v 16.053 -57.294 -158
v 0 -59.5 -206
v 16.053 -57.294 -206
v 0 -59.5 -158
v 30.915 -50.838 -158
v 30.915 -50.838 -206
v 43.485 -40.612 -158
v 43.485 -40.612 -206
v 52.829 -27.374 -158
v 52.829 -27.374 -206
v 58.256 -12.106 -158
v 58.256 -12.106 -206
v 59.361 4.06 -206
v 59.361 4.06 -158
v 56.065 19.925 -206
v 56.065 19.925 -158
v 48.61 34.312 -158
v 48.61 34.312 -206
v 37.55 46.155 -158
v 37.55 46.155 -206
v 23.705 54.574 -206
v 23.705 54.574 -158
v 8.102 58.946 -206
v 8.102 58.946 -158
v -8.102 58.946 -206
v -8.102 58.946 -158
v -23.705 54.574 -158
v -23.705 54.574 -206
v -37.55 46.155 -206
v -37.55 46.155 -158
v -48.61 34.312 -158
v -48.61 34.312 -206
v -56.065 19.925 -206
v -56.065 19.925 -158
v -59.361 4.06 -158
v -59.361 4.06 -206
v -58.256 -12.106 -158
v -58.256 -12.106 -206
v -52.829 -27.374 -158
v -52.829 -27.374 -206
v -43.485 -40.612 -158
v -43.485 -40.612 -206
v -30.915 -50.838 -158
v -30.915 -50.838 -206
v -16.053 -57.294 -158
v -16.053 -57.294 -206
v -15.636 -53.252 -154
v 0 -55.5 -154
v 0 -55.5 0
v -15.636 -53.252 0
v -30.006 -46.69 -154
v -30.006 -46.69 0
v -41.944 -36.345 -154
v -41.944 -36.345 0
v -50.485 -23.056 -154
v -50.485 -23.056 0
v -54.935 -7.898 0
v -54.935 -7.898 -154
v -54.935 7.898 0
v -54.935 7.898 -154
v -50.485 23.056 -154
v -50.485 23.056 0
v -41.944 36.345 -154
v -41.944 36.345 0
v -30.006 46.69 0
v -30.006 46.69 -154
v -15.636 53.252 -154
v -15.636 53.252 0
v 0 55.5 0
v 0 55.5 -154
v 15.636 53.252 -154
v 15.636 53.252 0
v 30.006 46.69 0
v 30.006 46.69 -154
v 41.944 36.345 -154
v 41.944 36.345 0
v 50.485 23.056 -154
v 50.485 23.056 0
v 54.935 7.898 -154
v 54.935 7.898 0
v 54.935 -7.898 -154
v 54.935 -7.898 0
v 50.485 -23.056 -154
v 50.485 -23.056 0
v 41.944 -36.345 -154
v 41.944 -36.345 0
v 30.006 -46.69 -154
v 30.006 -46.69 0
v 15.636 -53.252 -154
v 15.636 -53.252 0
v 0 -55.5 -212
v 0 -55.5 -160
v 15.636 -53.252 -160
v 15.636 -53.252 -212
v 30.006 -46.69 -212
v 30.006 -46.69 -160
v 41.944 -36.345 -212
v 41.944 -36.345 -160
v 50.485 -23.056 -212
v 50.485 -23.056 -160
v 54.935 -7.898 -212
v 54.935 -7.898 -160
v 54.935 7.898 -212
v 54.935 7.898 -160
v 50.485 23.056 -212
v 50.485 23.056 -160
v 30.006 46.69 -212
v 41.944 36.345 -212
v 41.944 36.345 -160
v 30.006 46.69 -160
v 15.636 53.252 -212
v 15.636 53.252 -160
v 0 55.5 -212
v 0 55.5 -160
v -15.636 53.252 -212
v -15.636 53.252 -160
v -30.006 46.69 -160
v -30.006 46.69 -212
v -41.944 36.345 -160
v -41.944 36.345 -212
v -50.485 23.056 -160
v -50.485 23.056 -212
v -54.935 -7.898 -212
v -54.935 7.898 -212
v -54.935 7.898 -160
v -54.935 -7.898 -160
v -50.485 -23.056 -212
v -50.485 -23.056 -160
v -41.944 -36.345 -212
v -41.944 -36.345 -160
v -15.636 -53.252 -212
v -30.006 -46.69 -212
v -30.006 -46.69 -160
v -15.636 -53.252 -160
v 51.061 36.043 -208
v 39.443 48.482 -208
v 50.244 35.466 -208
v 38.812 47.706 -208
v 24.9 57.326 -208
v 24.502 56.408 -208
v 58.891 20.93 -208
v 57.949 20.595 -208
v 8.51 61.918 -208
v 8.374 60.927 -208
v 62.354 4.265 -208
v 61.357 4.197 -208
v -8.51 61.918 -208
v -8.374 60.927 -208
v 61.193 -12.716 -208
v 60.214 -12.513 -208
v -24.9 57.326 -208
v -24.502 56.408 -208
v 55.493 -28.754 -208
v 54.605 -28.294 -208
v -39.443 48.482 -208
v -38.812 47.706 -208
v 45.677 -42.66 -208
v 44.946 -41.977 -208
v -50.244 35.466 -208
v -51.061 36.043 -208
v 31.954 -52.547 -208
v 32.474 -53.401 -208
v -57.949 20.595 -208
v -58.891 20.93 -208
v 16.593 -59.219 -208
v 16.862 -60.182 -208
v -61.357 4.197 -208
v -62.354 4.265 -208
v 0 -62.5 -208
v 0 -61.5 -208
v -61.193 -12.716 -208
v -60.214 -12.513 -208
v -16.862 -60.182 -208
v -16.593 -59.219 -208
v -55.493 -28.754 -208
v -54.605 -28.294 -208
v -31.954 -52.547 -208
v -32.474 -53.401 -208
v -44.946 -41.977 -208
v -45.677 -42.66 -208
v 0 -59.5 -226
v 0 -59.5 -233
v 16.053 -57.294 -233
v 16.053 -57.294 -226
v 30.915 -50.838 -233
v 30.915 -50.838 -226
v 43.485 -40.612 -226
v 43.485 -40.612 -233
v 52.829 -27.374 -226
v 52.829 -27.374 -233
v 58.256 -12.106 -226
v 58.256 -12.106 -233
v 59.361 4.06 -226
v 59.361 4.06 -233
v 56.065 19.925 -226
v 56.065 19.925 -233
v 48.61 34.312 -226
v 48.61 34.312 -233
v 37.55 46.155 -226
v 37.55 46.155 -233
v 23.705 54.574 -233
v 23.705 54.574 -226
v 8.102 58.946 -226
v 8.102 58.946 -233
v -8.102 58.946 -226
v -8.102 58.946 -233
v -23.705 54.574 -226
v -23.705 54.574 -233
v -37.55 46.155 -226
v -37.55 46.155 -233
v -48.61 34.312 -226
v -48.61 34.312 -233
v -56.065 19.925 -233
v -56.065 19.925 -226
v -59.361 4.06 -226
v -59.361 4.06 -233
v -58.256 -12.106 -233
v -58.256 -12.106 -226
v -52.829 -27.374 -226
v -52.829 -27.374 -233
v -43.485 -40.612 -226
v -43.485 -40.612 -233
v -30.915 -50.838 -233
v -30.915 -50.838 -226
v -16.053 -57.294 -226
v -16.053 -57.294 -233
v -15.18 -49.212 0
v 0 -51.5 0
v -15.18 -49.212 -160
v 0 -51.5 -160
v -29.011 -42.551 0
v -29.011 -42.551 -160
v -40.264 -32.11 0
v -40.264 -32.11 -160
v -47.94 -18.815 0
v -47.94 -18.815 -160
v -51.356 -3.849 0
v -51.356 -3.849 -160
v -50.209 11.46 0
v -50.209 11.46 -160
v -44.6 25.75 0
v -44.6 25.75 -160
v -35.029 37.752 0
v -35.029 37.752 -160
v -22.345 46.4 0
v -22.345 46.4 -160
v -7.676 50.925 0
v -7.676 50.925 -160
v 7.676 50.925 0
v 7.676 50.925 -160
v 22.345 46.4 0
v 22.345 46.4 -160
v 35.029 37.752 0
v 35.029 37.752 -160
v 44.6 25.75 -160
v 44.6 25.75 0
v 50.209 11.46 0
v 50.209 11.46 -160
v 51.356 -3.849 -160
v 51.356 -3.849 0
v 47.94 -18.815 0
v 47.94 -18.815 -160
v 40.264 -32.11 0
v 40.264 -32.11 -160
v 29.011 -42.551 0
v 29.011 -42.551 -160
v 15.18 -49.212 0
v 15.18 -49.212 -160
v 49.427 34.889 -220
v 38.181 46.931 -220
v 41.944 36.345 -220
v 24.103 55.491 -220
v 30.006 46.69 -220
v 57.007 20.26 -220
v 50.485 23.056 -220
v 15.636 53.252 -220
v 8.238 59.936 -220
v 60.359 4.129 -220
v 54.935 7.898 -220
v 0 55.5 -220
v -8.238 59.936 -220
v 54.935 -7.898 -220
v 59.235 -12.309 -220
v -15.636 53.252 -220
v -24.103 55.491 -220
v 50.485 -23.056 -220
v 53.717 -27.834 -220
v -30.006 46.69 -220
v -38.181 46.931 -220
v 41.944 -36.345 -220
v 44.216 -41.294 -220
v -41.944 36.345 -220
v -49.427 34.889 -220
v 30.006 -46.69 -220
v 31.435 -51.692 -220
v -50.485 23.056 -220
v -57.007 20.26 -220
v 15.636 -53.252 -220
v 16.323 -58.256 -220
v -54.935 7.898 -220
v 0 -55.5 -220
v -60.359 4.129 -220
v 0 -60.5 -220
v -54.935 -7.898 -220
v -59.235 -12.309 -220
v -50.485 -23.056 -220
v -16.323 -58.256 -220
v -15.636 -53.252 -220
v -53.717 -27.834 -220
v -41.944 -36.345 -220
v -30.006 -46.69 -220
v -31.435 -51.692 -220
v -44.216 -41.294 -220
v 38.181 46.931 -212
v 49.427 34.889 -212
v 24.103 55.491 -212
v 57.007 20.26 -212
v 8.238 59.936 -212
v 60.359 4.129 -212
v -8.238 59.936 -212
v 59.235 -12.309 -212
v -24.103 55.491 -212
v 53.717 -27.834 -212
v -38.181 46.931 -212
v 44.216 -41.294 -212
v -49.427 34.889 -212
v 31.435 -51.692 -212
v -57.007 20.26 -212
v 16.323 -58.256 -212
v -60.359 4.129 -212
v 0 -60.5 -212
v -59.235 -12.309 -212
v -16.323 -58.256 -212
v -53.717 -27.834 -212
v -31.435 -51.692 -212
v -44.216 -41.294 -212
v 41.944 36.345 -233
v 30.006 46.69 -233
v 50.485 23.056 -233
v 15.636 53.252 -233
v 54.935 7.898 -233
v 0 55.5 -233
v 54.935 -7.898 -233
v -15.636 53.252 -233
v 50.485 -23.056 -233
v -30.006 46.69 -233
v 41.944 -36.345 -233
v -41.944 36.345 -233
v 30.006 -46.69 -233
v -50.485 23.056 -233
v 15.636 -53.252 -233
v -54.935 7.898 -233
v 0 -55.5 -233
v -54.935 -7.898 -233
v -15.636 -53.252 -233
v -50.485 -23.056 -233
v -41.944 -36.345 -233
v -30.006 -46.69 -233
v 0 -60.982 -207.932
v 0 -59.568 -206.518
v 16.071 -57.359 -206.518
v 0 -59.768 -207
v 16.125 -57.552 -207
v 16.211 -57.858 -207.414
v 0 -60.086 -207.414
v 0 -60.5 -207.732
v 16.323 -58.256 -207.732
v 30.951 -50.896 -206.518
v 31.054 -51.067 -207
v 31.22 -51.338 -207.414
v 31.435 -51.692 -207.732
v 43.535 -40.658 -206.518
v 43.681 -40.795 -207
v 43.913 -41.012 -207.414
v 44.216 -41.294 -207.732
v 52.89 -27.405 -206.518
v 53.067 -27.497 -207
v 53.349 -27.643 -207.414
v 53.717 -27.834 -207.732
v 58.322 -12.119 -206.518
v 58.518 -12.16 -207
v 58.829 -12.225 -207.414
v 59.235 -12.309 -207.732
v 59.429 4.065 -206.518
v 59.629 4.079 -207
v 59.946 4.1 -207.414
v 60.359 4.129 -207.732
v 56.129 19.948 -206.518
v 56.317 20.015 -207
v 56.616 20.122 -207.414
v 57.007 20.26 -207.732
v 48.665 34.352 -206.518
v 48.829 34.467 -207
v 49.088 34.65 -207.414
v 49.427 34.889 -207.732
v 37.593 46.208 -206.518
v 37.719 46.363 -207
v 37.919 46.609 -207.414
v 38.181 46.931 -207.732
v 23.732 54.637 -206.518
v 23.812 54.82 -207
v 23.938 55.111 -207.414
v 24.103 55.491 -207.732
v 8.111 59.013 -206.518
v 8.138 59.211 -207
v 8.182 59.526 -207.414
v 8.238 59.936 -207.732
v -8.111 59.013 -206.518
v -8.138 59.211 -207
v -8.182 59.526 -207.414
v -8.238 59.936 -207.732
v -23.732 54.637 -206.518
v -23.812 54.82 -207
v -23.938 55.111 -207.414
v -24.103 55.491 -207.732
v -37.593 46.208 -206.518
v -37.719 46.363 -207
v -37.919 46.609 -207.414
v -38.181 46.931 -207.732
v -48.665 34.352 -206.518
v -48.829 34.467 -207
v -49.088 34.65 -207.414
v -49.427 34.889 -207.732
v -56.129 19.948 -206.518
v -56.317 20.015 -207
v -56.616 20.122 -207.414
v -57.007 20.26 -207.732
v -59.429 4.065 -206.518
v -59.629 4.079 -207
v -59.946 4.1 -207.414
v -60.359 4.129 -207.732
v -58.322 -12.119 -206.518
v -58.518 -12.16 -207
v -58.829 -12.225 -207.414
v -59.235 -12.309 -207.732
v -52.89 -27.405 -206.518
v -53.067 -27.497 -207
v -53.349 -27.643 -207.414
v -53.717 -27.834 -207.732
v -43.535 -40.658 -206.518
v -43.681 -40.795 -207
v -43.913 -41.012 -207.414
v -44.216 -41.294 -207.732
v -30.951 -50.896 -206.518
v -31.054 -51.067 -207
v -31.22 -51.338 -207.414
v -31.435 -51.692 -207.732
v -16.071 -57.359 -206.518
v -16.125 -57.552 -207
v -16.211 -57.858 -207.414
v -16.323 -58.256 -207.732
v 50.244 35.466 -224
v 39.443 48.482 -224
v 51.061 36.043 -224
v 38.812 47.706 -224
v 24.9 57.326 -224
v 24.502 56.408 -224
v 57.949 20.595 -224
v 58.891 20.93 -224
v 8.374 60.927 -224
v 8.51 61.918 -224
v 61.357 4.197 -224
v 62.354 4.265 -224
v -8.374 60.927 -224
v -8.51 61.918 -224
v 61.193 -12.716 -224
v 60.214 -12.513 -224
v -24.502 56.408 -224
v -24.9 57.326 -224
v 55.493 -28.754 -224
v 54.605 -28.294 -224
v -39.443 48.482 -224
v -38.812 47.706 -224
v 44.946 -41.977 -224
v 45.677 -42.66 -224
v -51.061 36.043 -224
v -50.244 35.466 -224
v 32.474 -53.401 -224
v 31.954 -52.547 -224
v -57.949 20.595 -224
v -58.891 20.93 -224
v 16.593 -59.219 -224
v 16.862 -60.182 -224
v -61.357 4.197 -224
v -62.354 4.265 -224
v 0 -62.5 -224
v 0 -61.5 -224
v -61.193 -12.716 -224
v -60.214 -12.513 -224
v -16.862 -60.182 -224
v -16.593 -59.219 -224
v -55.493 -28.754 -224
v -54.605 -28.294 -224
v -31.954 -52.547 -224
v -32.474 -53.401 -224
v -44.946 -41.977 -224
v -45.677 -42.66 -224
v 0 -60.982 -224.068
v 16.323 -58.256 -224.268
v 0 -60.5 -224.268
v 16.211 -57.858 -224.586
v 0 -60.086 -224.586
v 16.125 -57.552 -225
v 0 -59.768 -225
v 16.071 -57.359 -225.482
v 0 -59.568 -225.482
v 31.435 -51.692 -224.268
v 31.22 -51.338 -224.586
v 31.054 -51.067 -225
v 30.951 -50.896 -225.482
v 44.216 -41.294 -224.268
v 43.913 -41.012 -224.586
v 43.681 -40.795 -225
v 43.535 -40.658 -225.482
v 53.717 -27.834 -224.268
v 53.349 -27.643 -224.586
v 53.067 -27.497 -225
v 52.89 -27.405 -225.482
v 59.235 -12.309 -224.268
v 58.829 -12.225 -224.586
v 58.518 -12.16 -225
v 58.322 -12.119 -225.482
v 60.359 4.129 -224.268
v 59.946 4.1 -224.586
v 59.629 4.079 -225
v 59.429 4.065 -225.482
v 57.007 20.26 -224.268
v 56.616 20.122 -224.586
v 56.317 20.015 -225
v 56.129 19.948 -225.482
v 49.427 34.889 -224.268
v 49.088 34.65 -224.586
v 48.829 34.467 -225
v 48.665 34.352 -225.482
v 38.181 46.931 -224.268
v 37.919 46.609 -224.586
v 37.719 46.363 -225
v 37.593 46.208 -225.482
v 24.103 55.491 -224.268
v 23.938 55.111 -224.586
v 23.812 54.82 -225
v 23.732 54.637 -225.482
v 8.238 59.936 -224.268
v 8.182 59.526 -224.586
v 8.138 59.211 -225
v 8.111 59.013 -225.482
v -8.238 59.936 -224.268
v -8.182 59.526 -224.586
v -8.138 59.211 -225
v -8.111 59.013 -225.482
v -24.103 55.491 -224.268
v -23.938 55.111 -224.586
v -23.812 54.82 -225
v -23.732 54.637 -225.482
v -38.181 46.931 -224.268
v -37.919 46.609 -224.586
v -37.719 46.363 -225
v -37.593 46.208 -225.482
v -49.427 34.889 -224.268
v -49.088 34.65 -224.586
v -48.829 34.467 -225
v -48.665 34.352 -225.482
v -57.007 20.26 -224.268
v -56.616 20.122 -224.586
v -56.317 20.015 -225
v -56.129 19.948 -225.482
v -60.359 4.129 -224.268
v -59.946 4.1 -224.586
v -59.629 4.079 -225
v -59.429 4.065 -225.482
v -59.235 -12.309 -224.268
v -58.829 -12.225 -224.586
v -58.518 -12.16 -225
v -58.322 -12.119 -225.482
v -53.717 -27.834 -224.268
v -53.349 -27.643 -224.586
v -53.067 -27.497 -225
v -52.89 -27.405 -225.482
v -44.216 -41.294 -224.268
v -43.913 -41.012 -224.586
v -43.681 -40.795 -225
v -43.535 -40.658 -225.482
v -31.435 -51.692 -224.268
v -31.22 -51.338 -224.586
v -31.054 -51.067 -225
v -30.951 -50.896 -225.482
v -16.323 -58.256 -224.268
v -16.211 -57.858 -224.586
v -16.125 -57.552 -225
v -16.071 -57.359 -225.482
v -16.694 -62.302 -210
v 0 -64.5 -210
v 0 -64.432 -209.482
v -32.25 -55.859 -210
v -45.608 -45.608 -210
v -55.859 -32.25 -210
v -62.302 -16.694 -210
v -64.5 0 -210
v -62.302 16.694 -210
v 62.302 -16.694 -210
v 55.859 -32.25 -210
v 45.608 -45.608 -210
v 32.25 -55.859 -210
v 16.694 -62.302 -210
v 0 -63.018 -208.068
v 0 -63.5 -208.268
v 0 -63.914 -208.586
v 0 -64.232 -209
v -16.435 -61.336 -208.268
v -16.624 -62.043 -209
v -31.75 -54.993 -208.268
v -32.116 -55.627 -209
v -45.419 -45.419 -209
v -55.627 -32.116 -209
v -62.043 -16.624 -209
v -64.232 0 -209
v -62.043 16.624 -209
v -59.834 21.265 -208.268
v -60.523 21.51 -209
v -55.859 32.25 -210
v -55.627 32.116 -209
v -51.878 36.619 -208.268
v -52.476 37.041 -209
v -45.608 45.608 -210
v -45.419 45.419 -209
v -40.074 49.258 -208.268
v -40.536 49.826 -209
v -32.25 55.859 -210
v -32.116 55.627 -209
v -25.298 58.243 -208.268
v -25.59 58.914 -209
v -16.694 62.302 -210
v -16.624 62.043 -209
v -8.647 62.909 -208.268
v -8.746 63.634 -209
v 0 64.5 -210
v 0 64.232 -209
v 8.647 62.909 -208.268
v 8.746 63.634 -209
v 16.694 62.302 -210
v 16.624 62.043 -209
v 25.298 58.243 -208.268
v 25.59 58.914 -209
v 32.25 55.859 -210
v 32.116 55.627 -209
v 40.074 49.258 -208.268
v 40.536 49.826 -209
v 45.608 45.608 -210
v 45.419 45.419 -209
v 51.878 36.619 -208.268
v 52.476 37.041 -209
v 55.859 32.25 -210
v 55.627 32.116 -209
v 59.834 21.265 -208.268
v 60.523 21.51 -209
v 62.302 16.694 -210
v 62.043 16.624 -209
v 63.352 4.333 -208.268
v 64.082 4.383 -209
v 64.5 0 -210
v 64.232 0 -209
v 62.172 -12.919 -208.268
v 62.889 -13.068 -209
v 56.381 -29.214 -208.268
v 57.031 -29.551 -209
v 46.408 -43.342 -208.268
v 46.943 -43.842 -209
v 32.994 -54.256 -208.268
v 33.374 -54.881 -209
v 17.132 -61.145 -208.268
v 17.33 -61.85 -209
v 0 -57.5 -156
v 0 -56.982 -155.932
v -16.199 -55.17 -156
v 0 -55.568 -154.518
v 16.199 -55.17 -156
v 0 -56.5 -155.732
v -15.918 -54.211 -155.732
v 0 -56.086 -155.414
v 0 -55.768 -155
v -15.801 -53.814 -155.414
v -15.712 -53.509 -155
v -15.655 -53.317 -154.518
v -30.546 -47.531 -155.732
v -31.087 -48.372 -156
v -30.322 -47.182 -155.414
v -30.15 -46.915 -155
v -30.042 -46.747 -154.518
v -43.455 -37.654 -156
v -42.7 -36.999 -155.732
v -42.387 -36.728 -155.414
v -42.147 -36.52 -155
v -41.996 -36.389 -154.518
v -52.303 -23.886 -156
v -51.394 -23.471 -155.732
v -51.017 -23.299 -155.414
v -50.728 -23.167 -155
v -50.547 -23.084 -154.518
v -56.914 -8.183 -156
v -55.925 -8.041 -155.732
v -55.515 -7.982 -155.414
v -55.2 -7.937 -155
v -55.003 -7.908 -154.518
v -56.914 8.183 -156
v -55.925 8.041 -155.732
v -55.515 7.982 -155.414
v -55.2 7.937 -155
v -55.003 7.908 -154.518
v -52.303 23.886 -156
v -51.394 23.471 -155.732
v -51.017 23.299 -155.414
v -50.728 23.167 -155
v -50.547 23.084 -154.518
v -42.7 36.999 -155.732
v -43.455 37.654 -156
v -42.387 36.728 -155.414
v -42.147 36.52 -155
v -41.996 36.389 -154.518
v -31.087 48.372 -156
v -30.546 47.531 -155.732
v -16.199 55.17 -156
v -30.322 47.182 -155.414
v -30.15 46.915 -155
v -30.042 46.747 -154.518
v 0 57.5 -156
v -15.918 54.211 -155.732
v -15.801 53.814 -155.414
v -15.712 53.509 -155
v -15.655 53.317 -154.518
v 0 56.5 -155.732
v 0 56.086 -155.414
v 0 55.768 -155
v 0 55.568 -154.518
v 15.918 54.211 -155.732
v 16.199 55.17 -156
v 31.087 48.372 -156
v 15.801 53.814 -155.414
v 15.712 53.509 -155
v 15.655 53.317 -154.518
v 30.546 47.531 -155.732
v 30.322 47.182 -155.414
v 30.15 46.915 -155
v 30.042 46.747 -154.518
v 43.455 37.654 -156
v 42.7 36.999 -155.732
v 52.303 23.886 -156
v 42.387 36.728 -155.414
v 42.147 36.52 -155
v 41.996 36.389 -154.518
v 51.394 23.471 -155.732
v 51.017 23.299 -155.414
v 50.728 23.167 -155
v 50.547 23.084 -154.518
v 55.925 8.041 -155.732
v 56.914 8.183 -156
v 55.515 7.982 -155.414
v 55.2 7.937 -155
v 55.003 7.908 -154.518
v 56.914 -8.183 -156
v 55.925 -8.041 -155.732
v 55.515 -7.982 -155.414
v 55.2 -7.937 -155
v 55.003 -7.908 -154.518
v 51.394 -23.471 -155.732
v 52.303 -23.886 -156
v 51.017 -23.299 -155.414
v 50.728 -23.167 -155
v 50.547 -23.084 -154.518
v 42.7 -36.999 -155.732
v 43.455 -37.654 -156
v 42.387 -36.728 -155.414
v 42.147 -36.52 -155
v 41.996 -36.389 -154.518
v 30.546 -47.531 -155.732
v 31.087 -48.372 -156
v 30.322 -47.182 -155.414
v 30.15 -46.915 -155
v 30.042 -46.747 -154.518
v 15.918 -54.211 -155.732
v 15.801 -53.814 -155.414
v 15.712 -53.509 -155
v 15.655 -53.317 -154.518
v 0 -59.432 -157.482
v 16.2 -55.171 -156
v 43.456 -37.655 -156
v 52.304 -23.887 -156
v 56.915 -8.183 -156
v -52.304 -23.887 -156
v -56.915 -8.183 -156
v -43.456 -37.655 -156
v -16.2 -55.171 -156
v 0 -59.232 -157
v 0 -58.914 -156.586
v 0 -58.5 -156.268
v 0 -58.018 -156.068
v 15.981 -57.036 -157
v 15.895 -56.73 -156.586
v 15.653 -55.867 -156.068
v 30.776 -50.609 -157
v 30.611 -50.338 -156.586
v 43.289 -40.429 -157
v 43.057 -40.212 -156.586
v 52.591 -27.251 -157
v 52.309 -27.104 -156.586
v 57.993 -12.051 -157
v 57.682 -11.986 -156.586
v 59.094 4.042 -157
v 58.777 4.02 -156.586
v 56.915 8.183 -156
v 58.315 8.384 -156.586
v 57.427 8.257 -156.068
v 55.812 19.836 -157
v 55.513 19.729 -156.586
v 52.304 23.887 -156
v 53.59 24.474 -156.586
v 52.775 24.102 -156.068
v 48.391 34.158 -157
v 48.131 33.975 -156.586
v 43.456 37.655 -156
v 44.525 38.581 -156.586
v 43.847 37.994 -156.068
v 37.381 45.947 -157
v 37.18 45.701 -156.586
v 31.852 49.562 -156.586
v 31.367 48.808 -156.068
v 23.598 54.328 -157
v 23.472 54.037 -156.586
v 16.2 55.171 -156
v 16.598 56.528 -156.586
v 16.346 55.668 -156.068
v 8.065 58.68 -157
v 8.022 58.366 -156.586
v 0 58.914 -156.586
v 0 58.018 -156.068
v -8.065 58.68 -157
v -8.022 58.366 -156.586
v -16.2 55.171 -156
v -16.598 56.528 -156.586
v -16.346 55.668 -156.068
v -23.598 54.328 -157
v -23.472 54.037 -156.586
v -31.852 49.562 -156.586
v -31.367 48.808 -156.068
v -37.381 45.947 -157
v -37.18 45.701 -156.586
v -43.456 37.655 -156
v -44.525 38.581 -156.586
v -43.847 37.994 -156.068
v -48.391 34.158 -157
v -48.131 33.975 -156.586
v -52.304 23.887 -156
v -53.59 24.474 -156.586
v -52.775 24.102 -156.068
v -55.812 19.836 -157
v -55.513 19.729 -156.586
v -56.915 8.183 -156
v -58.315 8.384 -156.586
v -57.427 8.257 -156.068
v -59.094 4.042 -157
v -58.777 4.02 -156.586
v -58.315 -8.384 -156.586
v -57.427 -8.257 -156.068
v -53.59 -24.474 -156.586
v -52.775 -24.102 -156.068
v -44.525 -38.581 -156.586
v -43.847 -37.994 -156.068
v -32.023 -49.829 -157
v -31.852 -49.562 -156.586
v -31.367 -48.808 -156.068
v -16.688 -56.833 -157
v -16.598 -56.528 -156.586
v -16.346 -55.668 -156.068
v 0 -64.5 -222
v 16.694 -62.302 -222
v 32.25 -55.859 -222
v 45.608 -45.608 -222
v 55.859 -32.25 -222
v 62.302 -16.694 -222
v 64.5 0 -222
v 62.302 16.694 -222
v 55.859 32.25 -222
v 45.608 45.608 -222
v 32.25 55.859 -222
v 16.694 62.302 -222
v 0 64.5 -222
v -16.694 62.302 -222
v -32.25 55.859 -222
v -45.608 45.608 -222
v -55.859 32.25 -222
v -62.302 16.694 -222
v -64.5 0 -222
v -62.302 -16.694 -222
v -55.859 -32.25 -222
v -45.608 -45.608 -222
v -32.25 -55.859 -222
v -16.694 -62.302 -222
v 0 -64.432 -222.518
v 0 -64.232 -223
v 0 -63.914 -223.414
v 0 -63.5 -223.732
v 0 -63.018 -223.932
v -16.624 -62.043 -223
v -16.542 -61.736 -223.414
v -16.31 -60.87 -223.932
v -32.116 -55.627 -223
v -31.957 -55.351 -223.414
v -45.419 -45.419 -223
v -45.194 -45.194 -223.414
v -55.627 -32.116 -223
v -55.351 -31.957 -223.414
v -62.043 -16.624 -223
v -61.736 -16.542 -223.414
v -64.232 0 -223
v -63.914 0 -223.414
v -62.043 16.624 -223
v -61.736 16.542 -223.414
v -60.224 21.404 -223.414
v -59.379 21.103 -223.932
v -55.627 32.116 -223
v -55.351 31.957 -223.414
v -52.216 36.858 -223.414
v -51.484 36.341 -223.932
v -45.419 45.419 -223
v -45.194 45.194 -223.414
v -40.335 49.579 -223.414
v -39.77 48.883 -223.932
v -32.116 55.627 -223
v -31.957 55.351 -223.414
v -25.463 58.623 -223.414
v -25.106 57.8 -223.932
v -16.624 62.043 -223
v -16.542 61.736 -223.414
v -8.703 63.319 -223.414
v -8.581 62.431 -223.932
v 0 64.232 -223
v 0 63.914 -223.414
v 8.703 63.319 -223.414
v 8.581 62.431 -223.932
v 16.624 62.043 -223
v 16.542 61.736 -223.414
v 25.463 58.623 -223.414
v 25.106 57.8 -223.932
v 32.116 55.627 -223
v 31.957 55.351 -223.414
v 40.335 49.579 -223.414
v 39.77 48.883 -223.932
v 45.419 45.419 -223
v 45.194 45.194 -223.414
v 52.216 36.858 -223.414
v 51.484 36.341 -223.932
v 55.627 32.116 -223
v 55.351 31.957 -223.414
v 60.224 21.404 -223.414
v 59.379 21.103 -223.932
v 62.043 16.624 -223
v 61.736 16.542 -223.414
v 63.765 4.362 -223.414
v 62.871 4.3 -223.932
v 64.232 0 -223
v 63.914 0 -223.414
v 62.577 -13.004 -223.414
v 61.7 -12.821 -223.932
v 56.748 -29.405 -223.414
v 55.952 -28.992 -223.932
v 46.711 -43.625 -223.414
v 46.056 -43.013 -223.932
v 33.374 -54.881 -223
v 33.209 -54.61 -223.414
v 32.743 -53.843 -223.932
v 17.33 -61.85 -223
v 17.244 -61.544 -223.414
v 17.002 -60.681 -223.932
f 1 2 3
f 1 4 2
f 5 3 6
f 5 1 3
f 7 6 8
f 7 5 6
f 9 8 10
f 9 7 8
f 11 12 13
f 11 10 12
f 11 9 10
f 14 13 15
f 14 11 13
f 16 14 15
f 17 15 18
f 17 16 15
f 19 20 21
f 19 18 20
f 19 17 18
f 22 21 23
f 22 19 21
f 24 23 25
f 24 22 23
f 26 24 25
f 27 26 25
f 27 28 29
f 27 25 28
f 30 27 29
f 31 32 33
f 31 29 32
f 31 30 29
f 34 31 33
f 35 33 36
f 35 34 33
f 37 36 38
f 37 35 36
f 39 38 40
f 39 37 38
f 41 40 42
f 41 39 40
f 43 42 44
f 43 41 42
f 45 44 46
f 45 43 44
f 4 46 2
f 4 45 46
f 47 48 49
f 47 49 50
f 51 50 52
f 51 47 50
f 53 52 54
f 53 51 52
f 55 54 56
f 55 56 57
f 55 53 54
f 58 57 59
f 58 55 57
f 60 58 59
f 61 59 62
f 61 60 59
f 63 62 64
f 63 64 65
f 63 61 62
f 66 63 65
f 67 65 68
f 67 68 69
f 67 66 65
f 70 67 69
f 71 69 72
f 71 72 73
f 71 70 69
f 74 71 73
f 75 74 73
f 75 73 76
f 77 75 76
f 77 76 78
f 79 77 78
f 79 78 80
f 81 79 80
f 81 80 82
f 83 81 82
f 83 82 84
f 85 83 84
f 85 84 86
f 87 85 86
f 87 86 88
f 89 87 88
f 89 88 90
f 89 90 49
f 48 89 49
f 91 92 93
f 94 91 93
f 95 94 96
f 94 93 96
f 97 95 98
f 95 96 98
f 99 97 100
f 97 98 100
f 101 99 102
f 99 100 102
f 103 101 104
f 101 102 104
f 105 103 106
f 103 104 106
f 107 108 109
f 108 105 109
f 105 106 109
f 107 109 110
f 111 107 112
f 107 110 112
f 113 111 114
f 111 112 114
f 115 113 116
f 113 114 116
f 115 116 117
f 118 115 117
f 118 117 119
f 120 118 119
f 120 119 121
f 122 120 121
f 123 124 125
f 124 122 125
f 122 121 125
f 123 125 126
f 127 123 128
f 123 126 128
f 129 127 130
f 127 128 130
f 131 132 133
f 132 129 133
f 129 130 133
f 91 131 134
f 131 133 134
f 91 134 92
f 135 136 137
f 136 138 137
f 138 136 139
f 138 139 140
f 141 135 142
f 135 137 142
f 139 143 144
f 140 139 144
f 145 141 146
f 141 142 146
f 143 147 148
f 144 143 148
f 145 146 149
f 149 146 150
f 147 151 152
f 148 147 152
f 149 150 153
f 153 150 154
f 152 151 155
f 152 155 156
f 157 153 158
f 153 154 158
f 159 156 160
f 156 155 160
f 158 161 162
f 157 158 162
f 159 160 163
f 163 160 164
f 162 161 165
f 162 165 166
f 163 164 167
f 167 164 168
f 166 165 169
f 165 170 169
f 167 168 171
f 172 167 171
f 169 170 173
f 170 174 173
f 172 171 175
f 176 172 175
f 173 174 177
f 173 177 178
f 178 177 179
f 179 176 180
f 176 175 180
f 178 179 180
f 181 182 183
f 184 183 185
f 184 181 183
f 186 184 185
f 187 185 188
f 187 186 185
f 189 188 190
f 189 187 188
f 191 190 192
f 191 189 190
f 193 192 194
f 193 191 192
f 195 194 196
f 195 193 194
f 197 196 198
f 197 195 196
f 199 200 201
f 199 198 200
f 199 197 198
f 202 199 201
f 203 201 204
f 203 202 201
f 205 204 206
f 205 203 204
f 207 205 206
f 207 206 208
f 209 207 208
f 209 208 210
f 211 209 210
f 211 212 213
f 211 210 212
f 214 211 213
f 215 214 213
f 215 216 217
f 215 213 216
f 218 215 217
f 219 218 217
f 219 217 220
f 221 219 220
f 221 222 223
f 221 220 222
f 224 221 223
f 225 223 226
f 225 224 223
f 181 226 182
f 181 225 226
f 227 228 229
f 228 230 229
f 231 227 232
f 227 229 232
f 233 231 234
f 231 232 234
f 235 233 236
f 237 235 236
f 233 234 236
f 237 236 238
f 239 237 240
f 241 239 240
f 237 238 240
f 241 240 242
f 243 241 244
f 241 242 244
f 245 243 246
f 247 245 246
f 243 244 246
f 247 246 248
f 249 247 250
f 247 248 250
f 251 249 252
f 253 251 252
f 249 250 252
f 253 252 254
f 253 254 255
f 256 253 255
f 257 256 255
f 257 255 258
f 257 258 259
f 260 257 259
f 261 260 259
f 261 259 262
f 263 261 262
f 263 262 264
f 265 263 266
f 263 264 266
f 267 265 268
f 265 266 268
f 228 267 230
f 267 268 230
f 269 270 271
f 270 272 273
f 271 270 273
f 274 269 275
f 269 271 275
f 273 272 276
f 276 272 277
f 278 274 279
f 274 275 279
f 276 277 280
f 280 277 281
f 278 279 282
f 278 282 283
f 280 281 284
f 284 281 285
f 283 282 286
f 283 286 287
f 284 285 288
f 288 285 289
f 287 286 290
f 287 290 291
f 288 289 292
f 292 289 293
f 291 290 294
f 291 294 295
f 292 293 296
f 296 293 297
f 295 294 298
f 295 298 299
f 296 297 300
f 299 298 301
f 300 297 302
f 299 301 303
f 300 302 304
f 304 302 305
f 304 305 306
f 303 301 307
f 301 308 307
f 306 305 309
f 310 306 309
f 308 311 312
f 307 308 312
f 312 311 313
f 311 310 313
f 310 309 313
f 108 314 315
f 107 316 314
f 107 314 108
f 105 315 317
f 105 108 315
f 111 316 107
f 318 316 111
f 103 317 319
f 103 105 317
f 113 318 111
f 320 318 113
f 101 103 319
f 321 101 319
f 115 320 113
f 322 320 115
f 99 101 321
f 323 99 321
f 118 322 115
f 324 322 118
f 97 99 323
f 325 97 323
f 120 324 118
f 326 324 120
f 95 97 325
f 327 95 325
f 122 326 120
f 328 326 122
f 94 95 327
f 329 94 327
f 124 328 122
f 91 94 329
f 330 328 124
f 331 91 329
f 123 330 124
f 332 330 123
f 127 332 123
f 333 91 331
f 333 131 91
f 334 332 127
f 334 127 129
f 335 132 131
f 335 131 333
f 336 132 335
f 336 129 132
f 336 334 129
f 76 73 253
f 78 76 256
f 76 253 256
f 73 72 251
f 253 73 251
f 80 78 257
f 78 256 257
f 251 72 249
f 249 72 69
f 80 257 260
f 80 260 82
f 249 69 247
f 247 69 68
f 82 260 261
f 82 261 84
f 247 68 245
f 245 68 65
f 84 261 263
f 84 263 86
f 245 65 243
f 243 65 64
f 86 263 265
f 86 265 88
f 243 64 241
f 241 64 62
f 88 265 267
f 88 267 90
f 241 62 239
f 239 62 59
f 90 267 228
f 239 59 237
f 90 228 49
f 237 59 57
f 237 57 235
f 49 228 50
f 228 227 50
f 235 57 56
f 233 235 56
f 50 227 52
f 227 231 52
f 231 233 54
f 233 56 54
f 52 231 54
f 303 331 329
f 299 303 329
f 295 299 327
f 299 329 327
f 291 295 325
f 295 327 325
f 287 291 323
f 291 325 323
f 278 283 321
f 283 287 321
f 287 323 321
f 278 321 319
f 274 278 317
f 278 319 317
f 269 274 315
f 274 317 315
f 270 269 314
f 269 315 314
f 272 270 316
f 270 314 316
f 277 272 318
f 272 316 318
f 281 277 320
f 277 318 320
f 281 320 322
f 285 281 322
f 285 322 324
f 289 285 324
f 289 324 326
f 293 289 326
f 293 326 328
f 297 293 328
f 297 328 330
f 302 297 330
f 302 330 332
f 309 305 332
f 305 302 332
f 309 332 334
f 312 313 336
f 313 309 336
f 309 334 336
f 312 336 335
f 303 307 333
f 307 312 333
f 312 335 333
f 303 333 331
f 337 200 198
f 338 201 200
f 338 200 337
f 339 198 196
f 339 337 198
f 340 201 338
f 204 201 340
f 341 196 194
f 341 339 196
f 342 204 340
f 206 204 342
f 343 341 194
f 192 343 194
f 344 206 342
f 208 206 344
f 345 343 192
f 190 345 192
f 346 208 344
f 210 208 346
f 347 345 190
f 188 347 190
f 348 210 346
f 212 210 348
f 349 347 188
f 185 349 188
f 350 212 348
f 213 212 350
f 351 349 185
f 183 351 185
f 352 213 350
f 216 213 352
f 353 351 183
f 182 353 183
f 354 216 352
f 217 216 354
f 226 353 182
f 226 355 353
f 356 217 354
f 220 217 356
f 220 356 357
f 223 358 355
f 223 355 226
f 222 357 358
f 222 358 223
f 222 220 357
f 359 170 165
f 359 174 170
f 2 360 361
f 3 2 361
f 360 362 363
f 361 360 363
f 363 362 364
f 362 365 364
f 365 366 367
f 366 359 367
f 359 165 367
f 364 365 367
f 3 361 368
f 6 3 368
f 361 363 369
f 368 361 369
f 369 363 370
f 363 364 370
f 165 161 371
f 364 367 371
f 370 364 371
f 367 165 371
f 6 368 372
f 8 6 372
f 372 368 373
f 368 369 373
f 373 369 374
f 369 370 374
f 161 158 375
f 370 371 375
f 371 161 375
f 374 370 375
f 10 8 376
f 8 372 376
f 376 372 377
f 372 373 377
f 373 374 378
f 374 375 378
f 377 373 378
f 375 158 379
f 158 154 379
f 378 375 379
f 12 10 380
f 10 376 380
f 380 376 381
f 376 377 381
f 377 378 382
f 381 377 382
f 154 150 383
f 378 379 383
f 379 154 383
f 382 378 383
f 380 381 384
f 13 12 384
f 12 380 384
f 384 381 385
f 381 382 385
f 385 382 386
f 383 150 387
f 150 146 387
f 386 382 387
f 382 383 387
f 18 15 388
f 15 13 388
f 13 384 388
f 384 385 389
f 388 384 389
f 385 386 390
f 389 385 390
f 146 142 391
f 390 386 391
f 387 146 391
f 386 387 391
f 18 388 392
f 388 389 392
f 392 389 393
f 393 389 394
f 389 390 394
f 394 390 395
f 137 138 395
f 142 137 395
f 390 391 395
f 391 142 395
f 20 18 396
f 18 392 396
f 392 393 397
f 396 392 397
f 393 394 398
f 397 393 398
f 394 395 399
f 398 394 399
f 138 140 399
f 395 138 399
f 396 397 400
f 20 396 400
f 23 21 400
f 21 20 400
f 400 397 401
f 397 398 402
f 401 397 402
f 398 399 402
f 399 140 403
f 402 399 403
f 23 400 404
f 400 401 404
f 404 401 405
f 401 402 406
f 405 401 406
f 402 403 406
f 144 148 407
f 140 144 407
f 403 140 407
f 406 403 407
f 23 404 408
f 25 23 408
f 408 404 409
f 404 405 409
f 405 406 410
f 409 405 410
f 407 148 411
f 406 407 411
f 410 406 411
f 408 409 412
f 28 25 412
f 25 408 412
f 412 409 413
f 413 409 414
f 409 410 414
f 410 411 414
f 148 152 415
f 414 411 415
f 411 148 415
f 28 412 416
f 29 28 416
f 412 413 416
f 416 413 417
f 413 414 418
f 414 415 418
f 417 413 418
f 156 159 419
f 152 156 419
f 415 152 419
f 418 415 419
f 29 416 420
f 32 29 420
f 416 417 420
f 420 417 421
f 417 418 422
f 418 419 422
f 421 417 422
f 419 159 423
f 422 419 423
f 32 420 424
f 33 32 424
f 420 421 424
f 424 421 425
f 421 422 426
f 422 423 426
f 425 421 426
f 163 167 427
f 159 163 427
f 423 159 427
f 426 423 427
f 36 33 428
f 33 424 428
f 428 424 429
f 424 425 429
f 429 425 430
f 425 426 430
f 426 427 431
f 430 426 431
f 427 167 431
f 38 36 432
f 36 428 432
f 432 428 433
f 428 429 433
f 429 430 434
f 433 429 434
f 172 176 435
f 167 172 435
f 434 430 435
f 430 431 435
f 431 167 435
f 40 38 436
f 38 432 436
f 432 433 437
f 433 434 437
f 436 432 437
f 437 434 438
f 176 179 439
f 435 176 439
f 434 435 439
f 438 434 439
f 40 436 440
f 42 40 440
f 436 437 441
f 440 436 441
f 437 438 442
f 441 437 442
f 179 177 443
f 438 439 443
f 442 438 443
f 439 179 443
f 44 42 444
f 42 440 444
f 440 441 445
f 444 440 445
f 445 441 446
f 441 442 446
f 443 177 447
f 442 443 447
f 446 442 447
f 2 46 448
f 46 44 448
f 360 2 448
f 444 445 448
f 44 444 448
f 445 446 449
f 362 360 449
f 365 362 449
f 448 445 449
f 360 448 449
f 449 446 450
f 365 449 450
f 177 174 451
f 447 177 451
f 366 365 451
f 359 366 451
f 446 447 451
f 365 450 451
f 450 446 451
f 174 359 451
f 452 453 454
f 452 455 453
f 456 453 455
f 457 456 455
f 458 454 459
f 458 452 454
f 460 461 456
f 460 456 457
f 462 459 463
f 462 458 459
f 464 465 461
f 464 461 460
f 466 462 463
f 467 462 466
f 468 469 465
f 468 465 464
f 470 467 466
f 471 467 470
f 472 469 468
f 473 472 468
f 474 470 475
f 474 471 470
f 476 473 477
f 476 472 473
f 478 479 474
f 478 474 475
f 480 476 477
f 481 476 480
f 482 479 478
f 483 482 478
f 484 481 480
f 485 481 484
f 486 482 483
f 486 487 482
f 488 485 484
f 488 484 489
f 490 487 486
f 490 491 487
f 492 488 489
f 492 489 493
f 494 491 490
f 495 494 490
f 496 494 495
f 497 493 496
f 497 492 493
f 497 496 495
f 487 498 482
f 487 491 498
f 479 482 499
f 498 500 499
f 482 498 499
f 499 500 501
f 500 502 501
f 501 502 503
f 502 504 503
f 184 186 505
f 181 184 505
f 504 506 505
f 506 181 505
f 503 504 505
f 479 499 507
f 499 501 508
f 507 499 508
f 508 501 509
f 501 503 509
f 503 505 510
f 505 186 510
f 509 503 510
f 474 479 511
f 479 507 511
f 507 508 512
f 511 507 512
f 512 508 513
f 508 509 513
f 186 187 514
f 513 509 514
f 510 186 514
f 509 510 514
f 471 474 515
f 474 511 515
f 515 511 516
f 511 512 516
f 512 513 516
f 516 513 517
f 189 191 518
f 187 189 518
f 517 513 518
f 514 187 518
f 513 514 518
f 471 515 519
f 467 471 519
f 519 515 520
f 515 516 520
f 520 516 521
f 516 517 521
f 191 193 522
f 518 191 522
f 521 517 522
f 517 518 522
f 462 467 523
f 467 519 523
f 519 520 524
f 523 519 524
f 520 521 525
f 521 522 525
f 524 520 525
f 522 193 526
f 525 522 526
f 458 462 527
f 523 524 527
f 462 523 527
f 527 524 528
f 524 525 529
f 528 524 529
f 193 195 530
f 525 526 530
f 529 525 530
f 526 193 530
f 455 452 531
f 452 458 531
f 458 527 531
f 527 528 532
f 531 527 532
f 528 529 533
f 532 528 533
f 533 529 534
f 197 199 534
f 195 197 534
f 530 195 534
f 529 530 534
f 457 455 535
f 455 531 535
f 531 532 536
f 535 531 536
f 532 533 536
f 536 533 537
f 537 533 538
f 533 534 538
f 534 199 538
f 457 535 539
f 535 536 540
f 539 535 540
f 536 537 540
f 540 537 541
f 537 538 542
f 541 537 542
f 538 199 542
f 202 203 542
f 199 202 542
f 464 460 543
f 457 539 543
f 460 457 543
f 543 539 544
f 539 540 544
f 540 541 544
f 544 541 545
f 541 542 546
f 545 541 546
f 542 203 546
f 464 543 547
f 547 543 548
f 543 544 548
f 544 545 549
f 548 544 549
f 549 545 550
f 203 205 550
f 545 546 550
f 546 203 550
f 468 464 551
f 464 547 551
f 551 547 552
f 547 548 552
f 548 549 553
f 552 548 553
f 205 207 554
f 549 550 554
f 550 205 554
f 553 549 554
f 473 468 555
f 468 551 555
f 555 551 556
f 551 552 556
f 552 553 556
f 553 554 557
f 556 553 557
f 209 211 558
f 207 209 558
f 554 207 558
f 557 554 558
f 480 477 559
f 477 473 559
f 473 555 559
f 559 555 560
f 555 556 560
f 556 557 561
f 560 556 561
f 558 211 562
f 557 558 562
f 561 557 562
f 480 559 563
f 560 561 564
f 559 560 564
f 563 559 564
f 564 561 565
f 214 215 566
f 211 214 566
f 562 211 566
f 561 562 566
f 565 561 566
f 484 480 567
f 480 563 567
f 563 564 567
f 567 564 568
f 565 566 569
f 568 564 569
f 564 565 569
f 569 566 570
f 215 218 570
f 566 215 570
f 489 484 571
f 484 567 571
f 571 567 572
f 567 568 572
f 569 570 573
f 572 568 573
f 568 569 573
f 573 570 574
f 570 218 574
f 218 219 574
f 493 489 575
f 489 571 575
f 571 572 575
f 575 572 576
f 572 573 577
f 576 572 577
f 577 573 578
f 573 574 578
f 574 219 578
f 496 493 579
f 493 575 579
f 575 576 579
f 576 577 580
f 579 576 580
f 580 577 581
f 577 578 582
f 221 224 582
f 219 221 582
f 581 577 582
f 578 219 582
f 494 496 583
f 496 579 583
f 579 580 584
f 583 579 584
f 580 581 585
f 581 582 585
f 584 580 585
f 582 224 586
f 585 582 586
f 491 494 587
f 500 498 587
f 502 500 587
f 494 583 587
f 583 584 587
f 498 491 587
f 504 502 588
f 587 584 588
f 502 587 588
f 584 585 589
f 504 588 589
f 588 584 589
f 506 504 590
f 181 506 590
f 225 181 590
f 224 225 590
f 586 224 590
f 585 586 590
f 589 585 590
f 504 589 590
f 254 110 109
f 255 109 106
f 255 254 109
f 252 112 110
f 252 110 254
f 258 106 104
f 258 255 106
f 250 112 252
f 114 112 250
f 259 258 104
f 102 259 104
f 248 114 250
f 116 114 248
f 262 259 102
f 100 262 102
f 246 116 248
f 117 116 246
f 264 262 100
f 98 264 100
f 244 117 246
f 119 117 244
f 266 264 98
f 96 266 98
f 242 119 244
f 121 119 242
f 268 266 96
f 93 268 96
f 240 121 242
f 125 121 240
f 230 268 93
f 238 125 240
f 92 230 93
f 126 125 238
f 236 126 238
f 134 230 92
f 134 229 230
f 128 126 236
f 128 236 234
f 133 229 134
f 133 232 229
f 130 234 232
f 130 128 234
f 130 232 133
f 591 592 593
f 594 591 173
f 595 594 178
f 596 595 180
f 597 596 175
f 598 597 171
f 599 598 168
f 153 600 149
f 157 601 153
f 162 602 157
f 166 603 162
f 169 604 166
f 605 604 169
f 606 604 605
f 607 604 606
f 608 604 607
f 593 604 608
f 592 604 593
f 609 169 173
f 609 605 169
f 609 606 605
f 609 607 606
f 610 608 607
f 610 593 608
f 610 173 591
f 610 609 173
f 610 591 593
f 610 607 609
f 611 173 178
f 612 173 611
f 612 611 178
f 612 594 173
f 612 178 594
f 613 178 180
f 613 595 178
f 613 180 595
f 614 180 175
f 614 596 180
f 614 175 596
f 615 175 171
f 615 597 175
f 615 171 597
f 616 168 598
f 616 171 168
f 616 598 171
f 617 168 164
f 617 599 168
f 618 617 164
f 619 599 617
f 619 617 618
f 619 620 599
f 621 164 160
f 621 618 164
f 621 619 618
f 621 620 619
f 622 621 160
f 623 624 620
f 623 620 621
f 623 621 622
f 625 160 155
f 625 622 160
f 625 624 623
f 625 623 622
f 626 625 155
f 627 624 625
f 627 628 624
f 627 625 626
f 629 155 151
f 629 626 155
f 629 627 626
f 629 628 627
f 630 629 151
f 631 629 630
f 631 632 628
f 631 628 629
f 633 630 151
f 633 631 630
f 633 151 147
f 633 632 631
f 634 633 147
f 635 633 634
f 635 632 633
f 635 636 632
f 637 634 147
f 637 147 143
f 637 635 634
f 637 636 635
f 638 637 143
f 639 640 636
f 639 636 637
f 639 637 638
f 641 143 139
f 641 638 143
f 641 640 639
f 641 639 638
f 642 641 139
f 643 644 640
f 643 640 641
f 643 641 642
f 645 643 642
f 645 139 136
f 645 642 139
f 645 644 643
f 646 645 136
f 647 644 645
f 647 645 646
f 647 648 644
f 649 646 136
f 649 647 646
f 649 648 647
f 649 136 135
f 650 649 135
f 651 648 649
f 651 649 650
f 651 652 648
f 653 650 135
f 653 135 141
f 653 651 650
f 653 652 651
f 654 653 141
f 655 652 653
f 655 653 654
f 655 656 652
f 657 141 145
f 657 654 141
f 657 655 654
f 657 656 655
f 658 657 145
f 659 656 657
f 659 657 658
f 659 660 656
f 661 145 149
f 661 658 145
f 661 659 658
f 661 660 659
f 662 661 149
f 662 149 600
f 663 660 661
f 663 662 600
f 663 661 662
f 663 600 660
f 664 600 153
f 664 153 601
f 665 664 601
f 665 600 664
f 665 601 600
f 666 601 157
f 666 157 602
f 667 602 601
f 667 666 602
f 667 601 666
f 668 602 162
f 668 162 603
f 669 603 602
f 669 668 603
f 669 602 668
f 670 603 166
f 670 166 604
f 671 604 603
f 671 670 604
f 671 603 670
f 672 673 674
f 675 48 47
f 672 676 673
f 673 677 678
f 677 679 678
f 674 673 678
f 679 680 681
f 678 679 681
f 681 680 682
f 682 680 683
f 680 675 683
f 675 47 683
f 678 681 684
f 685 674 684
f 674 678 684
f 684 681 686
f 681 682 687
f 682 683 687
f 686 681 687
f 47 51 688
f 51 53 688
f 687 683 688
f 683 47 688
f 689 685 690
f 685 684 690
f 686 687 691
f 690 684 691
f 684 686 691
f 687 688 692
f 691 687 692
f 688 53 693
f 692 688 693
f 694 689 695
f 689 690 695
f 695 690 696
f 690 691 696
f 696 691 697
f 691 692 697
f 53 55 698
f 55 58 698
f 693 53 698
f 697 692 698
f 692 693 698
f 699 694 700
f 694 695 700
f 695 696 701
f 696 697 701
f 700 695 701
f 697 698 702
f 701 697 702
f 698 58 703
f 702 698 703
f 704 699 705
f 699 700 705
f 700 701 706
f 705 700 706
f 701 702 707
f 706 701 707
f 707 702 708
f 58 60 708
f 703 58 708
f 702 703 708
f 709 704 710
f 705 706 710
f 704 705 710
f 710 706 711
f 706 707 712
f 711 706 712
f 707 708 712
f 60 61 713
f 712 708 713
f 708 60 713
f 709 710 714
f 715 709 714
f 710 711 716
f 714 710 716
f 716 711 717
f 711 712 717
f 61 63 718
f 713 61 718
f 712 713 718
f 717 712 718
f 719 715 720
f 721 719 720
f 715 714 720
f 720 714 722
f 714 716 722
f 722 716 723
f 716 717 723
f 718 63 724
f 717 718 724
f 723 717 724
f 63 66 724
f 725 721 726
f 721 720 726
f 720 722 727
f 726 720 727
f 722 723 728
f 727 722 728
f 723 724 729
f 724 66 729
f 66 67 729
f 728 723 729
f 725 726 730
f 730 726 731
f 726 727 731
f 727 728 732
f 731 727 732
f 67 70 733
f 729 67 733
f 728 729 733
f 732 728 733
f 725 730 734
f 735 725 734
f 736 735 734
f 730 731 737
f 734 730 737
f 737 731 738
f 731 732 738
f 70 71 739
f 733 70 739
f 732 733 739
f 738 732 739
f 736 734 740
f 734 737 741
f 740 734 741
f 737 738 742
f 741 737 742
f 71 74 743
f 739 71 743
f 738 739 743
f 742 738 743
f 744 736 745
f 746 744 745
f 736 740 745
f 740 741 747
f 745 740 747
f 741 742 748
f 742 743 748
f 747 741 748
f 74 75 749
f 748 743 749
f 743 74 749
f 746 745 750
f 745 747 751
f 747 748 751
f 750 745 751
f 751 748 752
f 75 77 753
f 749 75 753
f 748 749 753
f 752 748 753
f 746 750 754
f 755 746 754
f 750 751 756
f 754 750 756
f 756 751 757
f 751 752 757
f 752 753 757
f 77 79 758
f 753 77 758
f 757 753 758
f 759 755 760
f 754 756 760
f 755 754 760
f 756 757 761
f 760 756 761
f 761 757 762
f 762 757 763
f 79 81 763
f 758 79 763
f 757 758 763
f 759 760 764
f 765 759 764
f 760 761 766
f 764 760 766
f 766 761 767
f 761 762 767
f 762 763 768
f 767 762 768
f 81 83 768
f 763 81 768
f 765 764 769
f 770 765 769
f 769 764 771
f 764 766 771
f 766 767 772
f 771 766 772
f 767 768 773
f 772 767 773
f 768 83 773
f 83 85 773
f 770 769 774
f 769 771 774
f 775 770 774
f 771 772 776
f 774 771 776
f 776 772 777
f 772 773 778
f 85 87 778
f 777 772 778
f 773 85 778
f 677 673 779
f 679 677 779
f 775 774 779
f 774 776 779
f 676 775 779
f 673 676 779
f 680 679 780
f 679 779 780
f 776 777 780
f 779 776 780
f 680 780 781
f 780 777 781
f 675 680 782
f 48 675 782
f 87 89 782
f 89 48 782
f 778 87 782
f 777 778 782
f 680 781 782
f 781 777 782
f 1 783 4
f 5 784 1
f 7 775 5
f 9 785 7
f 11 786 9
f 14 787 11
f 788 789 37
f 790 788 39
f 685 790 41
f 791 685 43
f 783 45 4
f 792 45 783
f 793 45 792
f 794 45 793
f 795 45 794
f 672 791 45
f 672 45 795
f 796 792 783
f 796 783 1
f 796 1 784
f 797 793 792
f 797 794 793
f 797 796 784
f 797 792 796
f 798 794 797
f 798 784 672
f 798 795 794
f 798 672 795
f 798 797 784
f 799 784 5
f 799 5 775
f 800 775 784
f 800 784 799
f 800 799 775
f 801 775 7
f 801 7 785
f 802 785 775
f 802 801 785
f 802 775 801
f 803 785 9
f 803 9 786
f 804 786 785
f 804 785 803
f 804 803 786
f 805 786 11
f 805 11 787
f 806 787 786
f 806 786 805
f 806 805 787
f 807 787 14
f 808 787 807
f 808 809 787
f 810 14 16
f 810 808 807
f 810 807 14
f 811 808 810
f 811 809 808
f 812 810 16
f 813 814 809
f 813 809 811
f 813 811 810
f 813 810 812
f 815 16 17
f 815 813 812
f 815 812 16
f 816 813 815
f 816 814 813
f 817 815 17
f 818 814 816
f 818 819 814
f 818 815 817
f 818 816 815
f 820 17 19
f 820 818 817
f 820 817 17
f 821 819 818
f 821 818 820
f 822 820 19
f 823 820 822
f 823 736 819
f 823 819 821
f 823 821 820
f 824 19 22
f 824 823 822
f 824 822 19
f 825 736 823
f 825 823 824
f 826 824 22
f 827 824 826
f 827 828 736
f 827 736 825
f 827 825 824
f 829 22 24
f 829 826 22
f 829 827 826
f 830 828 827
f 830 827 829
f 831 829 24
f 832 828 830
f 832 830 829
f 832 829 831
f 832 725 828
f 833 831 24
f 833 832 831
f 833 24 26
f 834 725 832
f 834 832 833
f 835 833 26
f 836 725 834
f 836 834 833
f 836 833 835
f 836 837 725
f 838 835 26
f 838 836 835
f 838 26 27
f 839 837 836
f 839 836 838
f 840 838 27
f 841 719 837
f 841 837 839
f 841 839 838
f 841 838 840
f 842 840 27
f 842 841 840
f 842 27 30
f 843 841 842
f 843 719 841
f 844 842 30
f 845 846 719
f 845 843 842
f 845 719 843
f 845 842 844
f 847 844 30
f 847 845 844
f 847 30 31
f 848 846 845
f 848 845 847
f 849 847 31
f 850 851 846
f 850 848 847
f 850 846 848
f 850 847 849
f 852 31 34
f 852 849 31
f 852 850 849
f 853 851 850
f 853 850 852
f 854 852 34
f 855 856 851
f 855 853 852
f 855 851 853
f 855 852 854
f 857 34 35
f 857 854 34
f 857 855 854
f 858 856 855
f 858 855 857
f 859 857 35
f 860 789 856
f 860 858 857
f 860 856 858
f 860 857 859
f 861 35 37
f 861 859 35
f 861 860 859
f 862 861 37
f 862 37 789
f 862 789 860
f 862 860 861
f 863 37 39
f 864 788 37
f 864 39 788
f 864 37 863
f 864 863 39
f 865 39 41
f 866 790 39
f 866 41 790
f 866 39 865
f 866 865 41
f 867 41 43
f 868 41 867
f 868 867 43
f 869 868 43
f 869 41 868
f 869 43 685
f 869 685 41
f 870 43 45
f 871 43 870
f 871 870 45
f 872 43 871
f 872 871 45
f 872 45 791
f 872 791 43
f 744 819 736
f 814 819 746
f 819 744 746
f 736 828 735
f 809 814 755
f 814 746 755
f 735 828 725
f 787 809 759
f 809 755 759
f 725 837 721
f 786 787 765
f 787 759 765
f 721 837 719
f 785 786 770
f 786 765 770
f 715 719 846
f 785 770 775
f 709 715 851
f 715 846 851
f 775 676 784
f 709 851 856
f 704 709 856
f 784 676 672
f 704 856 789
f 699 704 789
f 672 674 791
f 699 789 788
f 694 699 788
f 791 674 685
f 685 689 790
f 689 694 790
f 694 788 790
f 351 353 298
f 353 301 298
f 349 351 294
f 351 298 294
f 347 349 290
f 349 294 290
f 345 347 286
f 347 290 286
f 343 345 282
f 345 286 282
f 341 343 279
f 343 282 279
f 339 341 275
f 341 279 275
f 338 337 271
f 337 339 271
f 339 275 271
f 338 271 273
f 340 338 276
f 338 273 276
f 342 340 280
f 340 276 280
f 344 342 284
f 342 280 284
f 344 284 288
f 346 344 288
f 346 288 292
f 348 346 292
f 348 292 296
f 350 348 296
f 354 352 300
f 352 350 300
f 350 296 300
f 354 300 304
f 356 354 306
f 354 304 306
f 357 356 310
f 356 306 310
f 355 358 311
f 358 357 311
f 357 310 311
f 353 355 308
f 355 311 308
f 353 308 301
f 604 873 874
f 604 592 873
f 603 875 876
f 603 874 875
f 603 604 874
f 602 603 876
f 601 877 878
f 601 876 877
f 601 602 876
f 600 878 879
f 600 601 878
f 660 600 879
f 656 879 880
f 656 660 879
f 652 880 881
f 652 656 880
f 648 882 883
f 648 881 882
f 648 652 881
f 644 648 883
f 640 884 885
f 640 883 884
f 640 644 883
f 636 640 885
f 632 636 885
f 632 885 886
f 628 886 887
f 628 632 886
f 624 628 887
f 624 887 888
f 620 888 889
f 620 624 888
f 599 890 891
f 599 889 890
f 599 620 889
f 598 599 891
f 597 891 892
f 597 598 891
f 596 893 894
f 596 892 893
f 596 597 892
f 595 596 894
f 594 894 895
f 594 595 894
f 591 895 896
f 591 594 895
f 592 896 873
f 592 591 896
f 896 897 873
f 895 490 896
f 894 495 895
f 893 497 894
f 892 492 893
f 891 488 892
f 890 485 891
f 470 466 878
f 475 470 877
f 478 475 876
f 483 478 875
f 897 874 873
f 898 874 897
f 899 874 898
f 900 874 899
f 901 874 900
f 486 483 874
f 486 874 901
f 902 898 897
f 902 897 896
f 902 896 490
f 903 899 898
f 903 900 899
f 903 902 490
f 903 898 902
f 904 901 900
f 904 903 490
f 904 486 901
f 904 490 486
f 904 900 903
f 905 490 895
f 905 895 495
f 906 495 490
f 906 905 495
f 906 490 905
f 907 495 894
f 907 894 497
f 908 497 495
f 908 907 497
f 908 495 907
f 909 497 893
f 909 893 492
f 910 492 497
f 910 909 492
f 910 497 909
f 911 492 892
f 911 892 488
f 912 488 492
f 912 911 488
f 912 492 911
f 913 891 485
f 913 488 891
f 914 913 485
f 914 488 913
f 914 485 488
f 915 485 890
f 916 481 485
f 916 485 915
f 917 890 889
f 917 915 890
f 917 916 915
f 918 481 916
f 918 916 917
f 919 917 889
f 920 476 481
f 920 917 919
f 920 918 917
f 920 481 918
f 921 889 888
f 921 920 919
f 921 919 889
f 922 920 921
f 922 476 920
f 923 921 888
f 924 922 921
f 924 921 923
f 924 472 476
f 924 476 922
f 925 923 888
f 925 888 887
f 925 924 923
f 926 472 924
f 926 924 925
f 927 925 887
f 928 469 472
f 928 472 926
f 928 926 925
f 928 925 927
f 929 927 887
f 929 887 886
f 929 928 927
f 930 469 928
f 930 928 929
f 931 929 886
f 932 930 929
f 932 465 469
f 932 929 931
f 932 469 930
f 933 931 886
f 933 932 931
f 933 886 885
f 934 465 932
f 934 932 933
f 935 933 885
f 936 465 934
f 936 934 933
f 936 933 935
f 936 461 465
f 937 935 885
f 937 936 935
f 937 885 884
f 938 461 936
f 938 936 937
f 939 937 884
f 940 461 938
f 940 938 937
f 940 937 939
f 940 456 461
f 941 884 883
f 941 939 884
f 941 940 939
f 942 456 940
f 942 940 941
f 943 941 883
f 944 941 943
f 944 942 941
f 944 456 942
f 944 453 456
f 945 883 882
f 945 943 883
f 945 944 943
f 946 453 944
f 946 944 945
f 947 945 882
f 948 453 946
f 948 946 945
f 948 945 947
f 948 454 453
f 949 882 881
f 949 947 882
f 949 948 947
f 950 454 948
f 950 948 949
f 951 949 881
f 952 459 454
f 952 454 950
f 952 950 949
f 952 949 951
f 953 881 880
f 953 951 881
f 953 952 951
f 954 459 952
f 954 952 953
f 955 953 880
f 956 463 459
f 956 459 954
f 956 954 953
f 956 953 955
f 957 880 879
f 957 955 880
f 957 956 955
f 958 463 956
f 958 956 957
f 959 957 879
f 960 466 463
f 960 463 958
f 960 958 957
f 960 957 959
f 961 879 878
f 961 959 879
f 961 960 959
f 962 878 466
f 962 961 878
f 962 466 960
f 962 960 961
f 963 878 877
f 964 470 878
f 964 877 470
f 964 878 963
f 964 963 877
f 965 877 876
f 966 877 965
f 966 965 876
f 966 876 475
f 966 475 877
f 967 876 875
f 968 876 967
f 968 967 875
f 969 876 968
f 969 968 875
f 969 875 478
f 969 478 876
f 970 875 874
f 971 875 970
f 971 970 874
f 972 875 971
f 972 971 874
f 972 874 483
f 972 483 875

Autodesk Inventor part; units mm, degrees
ref_plane "YZ Plane" through (0, 0, 0) normal (1, 0, 0) x (0, 1, 0)
ref_plane "XZ Plane" through (0, 0, 0) normal (0, 1, 0) x (-1, 0, 0)
ref_plane "XY Plane" through (0, 0, 0) normal (0, 0, 1) x (1, 0, 0)
sketch "Sketch2" plane through (0, 0, 0) normal (1, 0, 0) x (0, 1, 0)
  line L0 (-51.5, 0) -> (-51.5, -160)
  line L1 (-51.5, -160) -> (-55.5, -160)
  line L2 (0, 0) -> (0, -206.7356) construction
  line L3 (-77.4, 0) -> (12.9, 0) construction
  line L4 (-55.5, 0) -> (-55.5, -156)
  line L5 (-55.5, -156) -> (-59.5, -156)
  line L6 (-59.5, -233) -> (-59.5, -224)
  line L7 (-59.5, -224) -> (-64.5, -224)
  line L8 (-64.5, -224) -> (-64.5, -208)
  line L9 (-64.5, -208) -> (-59.5, -208)
  line L10 (-59.5, -208) -> (-59.5, -156)
  line L11 (-55.5, -233) -> (-59.5, -233)
  line L12 (-55.5, -233) -> (-55.5, -220)
  line L13 (-55.5, -220) -> (-60.5, -220)
  line L14 (-60.5, -220) -> (-60.5, -212)
  line L15 (-60.5, -212) -> (-55.5, -212)
  line L16 (-55.5, -212) -> (-55.5, -160)
  line L17 (-55.5, 0) -> (-51.5, 0)
  dimension "d4" = 160
  dimension "d6" = 73
  dimension "d7" = 103
  dimension "d9" = 4
  dimension "d11" = 4
  dimension "d12" = 9
  dimension "d13" = 5
  dimension "d14" = 16
  dimension "d16" = 4
  dimension "d17" = 4
  dimension "d18" = 4
  dimension "d19" = 4
  dimension "d20" = 111
revolve "Revolution1" add sketch "Sketch2" angle 360 about axis through (0, 0, 0) along (0, 0, -1)
fillet "Fillet1" radius 2 2 edges at (0, 55.5, -156) (0, 59.5, -156)
fillet "Fillet2" radius 2 4 edges at (0, 64.5, -208) (0, 59.5, -208) (0, 64.5, -224) (0, 59.5, -224)
equation "\"d11\" = d9"
equation "\"d16\" = d11"
equation "\"d17\" = d11"
equation "\"d18\" = d16"
equation "\"d19\" = d16"
properties part number "hullPipe" material "PVC-Piping"
